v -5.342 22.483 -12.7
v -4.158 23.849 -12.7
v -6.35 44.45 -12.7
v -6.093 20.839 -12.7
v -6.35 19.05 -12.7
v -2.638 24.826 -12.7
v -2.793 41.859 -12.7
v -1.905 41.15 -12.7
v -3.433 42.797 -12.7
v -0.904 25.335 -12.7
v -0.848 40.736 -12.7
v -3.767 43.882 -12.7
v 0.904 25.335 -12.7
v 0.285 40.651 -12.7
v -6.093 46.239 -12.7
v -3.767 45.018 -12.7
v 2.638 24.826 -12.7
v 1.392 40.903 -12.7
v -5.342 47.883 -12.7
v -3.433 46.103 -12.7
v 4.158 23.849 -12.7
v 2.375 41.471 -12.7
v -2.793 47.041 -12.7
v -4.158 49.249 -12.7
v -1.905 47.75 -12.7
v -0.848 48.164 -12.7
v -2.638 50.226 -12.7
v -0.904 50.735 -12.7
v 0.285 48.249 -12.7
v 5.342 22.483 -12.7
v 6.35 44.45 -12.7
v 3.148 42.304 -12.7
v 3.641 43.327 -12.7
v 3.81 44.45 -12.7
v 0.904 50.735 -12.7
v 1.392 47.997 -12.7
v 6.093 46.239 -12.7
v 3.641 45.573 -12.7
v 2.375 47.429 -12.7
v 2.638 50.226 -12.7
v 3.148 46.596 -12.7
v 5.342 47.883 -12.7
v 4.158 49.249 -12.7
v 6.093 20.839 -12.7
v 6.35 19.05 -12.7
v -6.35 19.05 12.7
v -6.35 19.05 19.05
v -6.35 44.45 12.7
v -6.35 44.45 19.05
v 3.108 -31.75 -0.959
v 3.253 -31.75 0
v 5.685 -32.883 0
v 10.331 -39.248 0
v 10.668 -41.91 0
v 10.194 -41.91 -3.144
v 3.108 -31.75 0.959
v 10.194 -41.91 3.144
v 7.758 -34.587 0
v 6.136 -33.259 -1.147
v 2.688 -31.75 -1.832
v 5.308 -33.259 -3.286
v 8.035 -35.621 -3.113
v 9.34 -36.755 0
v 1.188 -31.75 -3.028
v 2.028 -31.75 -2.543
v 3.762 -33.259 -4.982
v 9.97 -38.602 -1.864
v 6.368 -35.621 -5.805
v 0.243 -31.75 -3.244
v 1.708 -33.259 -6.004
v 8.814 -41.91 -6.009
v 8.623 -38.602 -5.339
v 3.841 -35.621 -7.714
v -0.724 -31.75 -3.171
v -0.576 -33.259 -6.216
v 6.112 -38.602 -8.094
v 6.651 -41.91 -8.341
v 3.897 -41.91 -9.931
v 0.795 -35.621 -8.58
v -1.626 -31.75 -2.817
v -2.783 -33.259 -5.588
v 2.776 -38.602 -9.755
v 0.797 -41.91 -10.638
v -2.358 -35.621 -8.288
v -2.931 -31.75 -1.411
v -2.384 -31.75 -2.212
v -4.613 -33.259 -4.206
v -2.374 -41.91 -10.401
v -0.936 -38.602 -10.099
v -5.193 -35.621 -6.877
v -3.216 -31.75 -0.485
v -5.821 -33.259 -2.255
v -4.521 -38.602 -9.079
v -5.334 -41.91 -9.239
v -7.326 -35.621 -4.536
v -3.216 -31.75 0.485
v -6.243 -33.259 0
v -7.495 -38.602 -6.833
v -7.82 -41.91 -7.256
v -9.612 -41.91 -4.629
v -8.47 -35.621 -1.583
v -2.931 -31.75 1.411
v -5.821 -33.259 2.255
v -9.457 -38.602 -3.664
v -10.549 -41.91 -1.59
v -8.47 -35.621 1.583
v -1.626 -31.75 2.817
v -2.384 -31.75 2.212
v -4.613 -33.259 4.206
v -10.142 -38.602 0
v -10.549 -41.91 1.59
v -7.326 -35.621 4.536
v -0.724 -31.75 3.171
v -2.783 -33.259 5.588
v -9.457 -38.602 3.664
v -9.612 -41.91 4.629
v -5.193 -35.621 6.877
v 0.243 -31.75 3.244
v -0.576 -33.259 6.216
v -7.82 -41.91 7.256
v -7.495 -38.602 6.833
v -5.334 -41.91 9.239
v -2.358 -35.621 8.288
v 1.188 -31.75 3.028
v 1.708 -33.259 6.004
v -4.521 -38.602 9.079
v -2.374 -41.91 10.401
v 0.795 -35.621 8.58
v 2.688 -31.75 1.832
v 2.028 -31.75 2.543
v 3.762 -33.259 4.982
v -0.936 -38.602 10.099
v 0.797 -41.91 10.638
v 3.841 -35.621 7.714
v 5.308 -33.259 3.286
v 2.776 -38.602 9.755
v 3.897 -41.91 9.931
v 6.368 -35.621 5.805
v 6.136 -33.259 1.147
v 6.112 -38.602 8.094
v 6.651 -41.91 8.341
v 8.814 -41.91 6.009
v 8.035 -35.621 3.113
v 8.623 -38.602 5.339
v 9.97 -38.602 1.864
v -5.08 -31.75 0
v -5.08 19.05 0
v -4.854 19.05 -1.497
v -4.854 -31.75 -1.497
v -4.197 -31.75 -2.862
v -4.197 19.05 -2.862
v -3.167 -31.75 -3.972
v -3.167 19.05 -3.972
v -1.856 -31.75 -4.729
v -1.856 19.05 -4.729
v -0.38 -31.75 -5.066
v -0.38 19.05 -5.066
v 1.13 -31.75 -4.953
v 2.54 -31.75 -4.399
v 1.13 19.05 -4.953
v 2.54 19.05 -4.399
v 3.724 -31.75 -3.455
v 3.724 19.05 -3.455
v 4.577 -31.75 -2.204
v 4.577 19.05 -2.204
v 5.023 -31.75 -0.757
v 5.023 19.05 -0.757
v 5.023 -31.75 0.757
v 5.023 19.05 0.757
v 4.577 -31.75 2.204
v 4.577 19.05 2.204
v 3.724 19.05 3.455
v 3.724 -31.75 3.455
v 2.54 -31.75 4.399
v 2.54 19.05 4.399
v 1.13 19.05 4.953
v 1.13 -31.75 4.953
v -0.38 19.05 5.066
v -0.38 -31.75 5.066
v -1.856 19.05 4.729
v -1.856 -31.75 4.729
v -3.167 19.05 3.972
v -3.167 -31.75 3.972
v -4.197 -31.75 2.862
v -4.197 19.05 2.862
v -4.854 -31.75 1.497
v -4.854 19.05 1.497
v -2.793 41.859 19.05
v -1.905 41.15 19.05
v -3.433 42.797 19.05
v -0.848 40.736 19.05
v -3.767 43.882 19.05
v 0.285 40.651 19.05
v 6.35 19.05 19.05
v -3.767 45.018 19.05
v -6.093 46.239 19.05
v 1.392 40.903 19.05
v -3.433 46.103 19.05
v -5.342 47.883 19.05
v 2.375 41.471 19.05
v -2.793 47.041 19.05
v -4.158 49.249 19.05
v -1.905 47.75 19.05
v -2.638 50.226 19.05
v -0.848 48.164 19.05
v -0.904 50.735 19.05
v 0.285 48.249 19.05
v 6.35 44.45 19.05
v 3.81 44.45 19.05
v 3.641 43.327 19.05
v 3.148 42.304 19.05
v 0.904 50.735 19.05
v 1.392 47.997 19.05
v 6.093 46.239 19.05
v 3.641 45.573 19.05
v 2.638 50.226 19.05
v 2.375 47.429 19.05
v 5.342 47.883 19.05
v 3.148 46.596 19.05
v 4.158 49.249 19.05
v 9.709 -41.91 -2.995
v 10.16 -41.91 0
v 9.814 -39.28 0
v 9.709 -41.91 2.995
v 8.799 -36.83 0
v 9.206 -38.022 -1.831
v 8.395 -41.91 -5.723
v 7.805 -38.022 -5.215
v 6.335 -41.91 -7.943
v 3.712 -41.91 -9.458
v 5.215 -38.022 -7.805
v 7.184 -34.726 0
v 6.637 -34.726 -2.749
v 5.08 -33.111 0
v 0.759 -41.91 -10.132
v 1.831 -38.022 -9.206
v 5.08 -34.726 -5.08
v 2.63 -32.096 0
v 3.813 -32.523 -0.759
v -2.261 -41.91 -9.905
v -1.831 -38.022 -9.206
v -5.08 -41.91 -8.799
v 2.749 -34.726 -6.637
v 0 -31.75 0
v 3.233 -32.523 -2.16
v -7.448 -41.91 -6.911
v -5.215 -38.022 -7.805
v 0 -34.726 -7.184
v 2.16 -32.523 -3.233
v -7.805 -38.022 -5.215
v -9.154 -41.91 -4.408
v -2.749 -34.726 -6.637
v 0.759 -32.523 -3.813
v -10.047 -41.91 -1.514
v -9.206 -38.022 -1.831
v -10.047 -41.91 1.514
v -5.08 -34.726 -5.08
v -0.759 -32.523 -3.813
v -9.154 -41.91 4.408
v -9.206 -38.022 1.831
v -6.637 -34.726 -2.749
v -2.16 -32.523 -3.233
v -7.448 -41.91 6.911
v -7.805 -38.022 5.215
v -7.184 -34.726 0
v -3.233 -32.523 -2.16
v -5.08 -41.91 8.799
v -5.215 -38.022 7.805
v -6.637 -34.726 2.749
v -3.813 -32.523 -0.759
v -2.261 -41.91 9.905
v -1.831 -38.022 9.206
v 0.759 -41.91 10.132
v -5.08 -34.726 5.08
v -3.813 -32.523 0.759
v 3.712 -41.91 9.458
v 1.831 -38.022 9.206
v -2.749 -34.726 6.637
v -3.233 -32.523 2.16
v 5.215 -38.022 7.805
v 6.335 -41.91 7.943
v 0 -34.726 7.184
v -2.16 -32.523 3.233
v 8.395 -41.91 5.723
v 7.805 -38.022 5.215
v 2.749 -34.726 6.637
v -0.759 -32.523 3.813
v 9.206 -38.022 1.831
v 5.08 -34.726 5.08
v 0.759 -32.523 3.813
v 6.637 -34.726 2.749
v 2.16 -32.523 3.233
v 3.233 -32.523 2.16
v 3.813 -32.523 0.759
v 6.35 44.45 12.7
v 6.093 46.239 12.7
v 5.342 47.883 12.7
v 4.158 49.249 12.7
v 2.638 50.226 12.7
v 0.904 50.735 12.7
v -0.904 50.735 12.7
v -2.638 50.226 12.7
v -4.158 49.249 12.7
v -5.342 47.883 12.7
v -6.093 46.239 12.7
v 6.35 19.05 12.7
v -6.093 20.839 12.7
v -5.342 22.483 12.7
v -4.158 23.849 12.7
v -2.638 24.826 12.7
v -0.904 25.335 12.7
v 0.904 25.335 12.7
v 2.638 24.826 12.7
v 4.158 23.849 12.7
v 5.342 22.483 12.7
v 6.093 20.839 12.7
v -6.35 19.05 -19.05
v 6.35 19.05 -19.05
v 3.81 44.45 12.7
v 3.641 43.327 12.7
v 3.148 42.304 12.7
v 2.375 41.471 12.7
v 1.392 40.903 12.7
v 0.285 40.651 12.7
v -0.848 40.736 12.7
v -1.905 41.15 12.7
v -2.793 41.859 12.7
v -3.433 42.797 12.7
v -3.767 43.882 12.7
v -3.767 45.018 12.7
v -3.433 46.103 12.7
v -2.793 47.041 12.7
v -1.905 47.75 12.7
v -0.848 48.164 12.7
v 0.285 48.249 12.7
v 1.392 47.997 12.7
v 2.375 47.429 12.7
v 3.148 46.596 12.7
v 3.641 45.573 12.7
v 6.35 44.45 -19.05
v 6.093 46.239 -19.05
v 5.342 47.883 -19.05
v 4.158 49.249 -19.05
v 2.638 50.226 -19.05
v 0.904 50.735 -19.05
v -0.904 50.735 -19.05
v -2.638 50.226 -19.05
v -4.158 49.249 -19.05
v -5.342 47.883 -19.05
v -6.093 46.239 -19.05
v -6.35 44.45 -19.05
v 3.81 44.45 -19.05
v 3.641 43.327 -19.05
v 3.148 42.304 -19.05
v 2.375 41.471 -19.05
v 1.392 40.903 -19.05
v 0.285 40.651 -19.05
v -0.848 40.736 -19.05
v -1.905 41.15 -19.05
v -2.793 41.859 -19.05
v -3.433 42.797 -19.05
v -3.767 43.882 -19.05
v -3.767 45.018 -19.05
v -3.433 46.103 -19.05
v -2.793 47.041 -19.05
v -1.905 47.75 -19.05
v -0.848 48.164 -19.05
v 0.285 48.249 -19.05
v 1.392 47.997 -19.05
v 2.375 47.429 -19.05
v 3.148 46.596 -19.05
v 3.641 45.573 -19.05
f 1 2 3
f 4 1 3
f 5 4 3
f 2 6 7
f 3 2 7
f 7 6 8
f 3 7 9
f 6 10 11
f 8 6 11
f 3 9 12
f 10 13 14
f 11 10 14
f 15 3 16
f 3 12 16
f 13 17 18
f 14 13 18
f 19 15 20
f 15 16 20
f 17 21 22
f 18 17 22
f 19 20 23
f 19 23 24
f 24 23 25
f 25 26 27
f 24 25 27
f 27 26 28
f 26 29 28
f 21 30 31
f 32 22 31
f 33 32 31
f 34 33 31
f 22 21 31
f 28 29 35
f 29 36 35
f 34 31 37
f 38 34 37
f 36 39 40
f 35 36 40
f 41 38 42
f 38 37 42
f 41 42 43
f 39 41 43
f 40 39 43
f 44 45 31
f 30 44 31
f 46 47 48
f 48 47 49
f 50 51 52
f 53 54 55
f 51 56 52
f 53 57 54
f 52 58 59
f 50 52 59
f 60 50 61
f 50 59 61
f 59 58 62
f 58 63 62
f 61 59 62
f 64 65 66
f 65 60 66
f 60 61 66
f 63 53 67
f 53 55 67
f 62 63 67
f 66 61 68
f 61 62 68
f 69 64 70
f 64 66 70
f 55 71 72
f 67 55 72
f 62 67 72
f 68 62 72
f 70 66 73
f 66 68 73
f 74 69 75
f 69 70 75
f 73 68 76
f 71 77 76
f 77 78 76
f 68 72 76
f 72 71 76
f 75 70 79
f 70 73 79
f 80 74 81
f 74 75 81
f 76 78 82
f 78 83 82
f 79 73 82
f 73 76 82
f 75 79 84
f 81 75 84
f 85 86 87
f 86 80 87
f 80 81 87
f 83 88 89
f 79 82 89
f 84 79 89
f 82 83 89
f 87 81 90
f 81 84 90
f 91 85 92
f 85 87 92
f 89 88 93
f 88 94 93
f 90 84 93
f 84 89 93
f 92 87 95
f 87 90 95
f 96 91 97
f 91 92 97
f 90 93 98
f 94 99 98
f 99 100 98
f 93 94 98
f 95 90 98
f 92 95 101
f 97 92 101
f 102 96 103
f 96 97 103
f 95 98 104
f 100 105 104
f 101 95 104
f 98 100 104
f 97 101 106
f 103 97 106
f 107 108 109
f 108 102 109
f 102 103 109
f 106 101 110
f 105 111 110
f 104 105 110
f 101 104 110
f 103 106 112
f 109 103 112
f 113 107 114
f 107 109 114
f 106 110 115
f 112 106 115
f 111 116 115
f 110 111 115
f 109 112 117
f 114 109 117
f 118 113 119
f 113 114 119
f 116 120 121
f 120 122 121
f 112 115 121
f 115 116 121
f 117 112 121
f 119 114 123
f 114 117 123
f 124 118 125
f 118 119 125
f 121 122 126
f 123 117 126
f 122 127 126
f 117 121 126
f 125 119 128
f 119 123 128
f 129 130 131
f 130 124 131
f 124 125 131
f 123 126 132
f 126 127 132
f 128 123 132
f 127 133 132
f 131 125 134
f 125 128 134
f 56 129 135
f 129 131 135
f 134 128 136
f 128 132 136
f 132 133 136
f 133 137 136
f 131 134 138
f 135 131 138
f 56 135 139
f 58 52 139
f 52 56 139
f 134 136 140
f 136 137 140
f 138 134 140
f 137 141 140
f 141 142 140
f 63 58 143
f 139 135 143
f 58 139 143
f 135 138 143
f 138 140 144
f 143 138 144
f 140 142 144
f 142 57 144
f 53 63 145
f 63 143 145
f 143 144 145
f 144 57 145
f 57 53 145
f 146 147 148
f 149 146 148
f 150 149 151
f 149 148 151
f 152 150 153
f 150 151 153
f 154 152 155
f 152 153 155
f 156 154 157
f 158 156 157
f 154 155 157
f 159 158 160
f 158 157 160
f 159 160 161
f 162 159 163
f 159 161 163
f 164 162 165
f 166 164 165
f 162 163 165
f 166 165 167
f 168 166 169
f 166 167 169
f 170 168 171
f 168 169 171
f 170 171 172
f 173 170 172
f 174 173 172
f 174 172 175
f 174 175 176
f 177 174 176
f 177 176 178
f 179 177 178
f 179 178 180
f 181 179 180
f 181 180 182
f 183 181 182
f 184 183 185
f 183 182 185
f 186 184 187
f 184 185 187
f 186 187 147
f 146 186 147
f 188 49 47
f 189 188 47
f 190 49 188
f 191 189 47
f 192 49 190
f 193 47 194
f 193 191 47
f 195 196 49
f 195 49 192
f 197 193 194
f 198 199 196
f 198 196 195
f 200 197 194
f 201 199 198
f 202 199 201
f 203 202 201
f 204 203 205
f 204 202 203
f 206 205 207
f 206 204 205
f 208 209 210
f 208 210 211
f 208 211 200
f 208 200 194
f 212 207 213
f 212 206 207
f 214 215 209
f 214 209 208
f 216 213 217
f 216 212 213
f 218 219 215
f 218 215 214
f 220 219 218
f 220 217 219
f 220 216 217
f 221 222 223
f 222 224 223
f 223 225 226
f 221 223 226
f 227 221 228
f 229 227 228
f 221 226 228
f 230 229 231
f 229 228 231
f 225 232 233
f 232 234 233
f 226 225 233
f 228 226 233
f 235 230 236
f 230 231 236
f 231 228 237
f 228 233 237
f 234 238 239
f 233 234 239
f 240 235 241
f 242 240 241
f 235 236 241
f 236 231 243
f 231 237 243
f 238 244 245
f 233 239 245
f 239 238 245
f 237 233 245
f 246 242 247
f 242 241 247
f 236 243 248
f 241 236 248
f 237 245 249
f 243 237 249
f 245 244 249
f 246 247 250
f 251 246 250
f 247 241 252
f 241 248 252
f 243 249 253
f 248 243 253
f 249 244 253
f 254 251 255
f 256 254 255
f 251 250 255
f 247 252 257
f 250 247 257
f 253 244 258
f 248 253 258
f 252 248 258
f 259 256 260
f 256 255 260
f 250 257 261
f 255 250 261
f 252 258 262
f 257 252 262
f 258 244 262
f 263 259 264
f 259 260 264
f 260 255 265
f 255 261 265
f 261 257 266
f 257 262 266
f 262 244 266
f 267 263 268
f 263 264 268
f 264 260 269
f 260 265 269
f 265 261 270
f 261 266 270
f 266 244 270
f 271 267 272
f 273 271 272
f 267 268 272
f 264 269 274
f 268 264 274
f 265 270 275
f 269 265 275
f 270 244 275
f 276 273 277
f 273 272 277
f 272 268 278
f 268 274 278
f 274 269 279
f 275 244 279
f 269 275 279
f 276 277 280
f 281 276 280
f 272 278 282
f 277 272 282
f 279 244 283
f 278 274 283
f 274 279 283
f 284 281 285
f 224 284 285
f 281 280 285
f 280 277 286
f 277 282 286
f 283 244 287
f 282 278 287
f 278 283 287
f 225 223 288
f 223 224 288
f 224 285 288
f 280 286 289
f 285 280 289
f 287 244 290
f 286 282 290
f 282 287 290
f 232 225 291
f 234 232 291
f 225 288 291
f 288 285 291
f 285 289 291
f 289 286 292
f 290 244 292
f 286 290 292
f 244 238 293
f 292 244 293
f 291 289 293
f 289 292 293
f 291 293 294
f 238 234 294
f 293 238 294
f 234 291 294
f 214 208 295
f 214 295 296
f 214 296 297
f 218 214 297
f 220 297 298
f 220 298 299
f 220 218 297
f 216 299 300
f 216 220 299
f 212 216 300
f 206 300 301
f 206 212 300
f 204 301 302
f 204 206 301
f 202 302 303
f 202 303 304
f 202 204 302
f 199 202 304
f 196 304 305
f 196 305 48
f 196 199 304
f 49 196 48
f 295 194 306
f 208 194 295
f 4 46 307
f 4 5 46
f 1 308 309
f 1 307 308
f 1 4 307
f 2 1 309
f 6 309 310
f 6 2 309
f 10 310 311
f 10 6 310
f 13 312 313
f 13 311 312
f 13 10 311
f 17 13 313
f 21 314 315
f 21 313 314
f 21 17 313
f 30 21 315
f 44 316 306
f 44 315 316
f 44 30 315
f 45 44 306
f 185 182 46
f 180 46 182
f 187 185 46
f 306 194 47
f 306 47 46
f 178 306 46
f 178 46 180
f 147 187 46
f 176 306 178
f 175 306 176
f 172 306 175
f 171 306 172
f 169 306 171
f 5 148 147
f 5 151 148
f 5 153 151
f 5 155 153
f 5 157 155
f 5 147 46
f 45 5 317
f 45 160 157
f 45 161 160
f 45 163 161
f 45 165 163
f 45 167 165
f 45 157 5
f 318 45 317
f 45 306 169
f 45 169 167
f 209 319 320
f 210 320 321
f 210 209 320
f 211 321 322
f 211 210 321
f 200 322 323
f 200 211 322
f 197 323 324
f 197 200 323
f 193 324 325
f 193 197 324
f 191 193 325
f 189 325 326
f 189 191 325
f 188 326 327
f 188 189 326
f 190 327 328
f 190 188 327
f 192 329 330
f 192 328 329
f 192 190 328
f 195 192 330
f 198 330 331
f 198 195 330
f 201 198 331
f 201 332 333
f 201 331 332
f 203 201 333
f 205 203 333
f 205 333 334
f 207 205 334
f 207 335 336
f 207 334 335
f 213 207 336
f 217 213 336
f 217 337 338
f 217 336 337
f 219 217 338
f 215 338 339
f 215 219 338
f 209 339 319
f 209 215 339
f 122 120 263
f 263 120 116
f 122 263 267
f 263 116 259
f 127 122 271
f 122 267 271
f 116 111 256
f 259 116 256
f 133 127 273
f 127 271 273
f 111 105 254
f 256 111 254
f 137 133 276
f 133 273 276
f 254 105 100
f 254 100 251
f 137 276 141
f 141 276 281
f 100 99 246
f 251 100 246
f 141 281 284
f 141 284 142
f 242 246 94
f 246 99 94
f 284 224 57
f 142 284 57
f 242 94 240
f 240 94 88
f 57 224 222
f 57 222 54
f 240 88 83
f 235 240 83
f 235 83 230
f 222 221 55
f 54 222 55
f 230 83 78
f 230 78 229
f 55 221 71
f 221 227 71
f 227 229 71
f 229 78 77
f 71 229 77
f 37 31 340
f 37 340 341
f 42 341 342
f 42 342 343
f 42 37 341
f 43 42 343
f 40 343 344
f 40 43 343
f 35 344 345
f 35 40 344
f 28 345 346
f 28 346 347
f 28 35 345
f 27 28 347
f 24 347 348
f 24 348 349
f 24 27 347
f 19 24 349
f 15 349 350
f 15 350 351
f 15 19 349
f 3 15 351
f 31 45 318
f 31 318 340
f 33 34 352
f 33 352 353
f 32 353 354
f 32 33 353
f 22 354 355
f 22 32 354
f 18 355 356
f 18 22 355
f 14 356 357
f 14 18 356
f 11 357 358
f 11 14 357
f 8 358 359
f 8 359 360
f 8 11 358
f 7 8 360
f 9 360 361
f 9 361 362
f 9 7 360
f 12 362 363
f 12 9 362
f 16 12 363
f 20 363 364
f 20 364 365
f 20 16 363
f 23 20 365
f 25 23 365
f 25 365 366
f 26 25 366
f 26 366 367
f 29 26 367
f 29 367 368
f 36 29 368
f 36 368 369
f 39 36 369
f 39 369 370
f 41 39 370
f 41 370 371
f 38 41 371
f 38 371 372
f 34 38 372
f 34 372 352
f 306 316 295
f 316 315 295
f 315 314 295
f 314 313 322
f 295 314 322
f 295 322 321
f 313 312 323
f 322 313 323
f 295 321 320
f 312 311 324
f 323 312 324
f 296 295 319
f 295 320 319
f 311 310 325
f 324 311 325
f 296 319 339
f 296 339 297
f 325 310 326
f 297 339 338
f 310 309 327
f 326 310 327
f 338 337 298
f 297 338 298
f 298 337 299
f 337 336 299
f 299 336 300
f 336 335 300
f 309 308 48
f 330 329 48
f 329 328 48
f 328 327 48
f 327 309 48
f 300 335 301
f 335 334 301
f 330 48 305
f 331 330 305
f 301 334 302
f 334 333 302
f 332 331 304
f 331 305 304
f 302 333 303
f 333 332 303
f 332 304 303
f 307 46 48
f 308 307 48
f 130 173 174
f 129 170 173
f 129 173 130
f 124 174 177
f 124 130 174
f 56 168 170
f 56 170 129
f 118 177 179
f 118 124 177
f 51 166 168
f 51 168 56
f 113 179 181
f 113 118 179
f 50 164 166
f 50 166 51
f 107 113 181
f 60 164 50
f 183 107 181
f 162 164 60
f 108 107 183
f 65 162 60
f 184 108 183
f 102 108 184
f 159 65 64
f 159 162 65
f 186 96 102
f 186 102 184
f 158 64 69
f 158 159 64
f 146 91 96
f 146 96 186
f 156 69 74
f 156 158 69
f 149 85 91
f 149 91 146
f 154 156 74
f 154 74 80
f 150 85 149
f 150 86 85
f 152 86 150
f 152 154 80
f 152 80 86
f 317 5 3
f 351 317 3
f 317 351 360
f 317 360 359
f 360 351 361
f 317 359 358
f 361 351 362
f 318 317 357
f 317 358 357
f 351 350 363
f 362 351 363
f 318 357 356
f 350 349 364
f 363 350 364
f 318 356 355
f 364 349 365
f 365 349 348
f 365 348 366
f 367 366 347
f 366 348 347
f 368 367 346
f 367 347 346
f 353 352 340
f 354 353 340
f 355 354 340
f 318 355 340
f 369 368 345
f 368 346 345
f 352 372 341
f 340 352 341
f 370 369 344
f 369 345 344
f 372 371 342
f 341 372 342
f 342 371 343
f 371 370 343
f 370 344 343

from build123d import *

# Parameters (mm, degrees)
SKETCH1_W           = 12.7
SKETCH1_H           = 101.6
BOSS_EXTRUDE1_DEPTH = 19.05
FILLET2_RADIUS      = 6.35
FILLET2_LENGTH      = 38.1
SKETCH2_R           = 3.81
CUT_EXTRUDE1_DEPTH  = 38.1
FILLET3_RADIUS      = 6.35
FILLET3_LENGTH      = 38.1
SKETCH3_W           = 25.4
SKETCH3_H           = 25.4
CUT_EXTRUDE2_DEPTH  = 56.72102386
FILLET4_RADIUS      = 6.35
FILLET4_LENGTH      = 25.4
SKETCH4_W           = 45.439126892
SKETCH4_H           = 74.581358872
CUT_EXTRUDE3_DEPTH  = 56.72102386
SKETCH5_R           = 5.08
BOSS_EXTRUDE2_DEPTH = 50.8


with BuildPart() as part:
    # Sketch1 → Boss-Extrude1 (new, symmetric)
    with BuildSketch(Plane.XY):
        Rectangle(SKETCH1_W, SKETCH1_H)
    extrude(amount=BOSS_EXTRUDE1_DEPTH, both=True)

    # Fillet2: full round fillet: the end face becomes a half cylinder, R = half its width
    fillet2_face = Plane((0, -50.8, 0), x_dir=(0, 0, 1), z_dir=(0, -1, 0))  # on the end face: x along it, z out of the body
    fillet2_slab = fillet2_face.offset(-FILLET2_RADIUS / 2) * Box(FILLET2_LENGTH, 2 * FILLET2_RADIUS, FILLET2_RADIUS, mode=Mode.PRIVATE)  # the body's end, R deep
    fillet2_round = Plane((0, -44.45, 0), x_dir=(0, -1, 0), z_dir=(0, 0, 1)) * Cylinder(FILLET2_RADIUS, FILLET2_LENGTH, mode=Mode.PRIVATE)  # its axis R under the face
    add(fillet2_slab - fillet2_round, mode=Mode.SUBTRACT)

    # Sketch2 → Cut-Extrude1 (cut)
    with BuildSketch(Plane.XY.offset(19.05)):
        with Locations((0, -44.45)):
            Circle(SKETCH2_R)
    cut_extrude1 = extrude(amount=-CUT_EXTRUDE1_DEPTH, mode=Mode.SUBTRACT)

    # Mirror3: Cut-Extrude1 across plane
    add(cut_extrude1.mirror(Plane.ZX), mode=Mode.SUBTRACT)

    # Fillet3: full round fillet: the end face becomes a half cylinder, R = half its width
    fillet3_face = Plane((0, 50.8, 0), x_dir=(0, 0, 1), z_dir=(0, 1, 0))  # on the end face: x along it, z out of the body
    fillet3_slab = fillet3_face.offset(-FILLET3_RADIUS / 2) * Box(FILLET3_LENGTH, 2 * FILLET3_RADIUS, FILLET3_RADIUS, mode=Mode.PRIVATE)  # the body's end, R deep
    fillet3_round = Plane((0, 44.45, 0), x_dir=(0, 1, 0), z_dir=(0, 0, 1)) * Cylinder(FILLET3_RADIUS, FILLET3_LENGTH, mode=Mode.PRIVATE)  # its axis R under the face
    add(fillet3_slab - fillet3_round, mode=Mode.SUBTRACT)

    # Sketch3 → Cut-Extrude2 (cut, through all)
    with BuildSketch(Plane.ZY.offset(6.35)):
        with Locations((0, 38.1)):
            Rectangle(SKETCH3_W, SKETCH3_H)
    extrude(amount=-CUT_EXTRUDE2_DEPTH, mode=Mode.SUBTRACT)

    # Fillet4: full round fillet: the end face becomes a half cylinder, R = half its width
    fillet4_face = Plane((0, 25.4, 0), x_dir=(0, 0, -1), z_dir=(0, 1, 0))  # on the end face: x along it, z out of the body
    fillet4_slab = fillet4_face.offset(-FILLET4_RADIUS / 2) * Box(FILLET4_LENGTH, 2 * FILLET4_RADIUS, FILLET4_RADIUS, mode=Mode.PRIVATE)  # the body's end, R deep
    fillet4_round = Plane((0, 19.05, 0), x_dir=(0, 1, 0), z_dir=(0, 0, -1)) * Cylinder(FILLET4_RADIUS, FILLET4_LENGTH, mode=Mode.PRIVATE)  # its axis R under the face
    add(fillet4_slab - fillet4_round, mode=Mode.SUBTRACT)

    # Sketch4 → Cut-Extrude3 (cut, through all)
    with BuildSketch(Plane(origin=(6.35, 0, 0), x_dir=(0, 0, -1), z_dir=(1, 0, 0))):
        with Locations((3.669563446, -18.240679436)):
            Rectangle(SKETCH4_W, SKETCH4_H)
    extrude(amount=-CUT_EXTRUDE3_DEPTH, mode=Mode.SUBTRACT)

    # Sketch5 → Boss-Extrude2 (add)
    with BuildSketch(Plane.XZ.offset(-19.05)):
        with Locations(Location((0, 0, 0), (0, 0, 180))):
            Circle(SKETCH5_R)
    extrude(amount=BOSS_EXTRUDE2_DEPTH)

    # Sketch8 → Revolve-Thin1 (revolve)
    with BuildSketch(Plane.XY):
        with BuildLine():
            ThreePointArc((10.16, -41.91), (7.184204897, -34.725795103), (0, -31.75))
            Line((0, -31.75), (0, -31.242))
            ThreePointArc((0, -31.242), (7.543415142, -34.366584858), (10.668, -41.91))
            Line((10.668, -41.91), (10.16, -41.91))
        make_face()
    revolve(axis=Axis((0, -58.668197781, 0), (0, 1, 0)))


solid = part.part
